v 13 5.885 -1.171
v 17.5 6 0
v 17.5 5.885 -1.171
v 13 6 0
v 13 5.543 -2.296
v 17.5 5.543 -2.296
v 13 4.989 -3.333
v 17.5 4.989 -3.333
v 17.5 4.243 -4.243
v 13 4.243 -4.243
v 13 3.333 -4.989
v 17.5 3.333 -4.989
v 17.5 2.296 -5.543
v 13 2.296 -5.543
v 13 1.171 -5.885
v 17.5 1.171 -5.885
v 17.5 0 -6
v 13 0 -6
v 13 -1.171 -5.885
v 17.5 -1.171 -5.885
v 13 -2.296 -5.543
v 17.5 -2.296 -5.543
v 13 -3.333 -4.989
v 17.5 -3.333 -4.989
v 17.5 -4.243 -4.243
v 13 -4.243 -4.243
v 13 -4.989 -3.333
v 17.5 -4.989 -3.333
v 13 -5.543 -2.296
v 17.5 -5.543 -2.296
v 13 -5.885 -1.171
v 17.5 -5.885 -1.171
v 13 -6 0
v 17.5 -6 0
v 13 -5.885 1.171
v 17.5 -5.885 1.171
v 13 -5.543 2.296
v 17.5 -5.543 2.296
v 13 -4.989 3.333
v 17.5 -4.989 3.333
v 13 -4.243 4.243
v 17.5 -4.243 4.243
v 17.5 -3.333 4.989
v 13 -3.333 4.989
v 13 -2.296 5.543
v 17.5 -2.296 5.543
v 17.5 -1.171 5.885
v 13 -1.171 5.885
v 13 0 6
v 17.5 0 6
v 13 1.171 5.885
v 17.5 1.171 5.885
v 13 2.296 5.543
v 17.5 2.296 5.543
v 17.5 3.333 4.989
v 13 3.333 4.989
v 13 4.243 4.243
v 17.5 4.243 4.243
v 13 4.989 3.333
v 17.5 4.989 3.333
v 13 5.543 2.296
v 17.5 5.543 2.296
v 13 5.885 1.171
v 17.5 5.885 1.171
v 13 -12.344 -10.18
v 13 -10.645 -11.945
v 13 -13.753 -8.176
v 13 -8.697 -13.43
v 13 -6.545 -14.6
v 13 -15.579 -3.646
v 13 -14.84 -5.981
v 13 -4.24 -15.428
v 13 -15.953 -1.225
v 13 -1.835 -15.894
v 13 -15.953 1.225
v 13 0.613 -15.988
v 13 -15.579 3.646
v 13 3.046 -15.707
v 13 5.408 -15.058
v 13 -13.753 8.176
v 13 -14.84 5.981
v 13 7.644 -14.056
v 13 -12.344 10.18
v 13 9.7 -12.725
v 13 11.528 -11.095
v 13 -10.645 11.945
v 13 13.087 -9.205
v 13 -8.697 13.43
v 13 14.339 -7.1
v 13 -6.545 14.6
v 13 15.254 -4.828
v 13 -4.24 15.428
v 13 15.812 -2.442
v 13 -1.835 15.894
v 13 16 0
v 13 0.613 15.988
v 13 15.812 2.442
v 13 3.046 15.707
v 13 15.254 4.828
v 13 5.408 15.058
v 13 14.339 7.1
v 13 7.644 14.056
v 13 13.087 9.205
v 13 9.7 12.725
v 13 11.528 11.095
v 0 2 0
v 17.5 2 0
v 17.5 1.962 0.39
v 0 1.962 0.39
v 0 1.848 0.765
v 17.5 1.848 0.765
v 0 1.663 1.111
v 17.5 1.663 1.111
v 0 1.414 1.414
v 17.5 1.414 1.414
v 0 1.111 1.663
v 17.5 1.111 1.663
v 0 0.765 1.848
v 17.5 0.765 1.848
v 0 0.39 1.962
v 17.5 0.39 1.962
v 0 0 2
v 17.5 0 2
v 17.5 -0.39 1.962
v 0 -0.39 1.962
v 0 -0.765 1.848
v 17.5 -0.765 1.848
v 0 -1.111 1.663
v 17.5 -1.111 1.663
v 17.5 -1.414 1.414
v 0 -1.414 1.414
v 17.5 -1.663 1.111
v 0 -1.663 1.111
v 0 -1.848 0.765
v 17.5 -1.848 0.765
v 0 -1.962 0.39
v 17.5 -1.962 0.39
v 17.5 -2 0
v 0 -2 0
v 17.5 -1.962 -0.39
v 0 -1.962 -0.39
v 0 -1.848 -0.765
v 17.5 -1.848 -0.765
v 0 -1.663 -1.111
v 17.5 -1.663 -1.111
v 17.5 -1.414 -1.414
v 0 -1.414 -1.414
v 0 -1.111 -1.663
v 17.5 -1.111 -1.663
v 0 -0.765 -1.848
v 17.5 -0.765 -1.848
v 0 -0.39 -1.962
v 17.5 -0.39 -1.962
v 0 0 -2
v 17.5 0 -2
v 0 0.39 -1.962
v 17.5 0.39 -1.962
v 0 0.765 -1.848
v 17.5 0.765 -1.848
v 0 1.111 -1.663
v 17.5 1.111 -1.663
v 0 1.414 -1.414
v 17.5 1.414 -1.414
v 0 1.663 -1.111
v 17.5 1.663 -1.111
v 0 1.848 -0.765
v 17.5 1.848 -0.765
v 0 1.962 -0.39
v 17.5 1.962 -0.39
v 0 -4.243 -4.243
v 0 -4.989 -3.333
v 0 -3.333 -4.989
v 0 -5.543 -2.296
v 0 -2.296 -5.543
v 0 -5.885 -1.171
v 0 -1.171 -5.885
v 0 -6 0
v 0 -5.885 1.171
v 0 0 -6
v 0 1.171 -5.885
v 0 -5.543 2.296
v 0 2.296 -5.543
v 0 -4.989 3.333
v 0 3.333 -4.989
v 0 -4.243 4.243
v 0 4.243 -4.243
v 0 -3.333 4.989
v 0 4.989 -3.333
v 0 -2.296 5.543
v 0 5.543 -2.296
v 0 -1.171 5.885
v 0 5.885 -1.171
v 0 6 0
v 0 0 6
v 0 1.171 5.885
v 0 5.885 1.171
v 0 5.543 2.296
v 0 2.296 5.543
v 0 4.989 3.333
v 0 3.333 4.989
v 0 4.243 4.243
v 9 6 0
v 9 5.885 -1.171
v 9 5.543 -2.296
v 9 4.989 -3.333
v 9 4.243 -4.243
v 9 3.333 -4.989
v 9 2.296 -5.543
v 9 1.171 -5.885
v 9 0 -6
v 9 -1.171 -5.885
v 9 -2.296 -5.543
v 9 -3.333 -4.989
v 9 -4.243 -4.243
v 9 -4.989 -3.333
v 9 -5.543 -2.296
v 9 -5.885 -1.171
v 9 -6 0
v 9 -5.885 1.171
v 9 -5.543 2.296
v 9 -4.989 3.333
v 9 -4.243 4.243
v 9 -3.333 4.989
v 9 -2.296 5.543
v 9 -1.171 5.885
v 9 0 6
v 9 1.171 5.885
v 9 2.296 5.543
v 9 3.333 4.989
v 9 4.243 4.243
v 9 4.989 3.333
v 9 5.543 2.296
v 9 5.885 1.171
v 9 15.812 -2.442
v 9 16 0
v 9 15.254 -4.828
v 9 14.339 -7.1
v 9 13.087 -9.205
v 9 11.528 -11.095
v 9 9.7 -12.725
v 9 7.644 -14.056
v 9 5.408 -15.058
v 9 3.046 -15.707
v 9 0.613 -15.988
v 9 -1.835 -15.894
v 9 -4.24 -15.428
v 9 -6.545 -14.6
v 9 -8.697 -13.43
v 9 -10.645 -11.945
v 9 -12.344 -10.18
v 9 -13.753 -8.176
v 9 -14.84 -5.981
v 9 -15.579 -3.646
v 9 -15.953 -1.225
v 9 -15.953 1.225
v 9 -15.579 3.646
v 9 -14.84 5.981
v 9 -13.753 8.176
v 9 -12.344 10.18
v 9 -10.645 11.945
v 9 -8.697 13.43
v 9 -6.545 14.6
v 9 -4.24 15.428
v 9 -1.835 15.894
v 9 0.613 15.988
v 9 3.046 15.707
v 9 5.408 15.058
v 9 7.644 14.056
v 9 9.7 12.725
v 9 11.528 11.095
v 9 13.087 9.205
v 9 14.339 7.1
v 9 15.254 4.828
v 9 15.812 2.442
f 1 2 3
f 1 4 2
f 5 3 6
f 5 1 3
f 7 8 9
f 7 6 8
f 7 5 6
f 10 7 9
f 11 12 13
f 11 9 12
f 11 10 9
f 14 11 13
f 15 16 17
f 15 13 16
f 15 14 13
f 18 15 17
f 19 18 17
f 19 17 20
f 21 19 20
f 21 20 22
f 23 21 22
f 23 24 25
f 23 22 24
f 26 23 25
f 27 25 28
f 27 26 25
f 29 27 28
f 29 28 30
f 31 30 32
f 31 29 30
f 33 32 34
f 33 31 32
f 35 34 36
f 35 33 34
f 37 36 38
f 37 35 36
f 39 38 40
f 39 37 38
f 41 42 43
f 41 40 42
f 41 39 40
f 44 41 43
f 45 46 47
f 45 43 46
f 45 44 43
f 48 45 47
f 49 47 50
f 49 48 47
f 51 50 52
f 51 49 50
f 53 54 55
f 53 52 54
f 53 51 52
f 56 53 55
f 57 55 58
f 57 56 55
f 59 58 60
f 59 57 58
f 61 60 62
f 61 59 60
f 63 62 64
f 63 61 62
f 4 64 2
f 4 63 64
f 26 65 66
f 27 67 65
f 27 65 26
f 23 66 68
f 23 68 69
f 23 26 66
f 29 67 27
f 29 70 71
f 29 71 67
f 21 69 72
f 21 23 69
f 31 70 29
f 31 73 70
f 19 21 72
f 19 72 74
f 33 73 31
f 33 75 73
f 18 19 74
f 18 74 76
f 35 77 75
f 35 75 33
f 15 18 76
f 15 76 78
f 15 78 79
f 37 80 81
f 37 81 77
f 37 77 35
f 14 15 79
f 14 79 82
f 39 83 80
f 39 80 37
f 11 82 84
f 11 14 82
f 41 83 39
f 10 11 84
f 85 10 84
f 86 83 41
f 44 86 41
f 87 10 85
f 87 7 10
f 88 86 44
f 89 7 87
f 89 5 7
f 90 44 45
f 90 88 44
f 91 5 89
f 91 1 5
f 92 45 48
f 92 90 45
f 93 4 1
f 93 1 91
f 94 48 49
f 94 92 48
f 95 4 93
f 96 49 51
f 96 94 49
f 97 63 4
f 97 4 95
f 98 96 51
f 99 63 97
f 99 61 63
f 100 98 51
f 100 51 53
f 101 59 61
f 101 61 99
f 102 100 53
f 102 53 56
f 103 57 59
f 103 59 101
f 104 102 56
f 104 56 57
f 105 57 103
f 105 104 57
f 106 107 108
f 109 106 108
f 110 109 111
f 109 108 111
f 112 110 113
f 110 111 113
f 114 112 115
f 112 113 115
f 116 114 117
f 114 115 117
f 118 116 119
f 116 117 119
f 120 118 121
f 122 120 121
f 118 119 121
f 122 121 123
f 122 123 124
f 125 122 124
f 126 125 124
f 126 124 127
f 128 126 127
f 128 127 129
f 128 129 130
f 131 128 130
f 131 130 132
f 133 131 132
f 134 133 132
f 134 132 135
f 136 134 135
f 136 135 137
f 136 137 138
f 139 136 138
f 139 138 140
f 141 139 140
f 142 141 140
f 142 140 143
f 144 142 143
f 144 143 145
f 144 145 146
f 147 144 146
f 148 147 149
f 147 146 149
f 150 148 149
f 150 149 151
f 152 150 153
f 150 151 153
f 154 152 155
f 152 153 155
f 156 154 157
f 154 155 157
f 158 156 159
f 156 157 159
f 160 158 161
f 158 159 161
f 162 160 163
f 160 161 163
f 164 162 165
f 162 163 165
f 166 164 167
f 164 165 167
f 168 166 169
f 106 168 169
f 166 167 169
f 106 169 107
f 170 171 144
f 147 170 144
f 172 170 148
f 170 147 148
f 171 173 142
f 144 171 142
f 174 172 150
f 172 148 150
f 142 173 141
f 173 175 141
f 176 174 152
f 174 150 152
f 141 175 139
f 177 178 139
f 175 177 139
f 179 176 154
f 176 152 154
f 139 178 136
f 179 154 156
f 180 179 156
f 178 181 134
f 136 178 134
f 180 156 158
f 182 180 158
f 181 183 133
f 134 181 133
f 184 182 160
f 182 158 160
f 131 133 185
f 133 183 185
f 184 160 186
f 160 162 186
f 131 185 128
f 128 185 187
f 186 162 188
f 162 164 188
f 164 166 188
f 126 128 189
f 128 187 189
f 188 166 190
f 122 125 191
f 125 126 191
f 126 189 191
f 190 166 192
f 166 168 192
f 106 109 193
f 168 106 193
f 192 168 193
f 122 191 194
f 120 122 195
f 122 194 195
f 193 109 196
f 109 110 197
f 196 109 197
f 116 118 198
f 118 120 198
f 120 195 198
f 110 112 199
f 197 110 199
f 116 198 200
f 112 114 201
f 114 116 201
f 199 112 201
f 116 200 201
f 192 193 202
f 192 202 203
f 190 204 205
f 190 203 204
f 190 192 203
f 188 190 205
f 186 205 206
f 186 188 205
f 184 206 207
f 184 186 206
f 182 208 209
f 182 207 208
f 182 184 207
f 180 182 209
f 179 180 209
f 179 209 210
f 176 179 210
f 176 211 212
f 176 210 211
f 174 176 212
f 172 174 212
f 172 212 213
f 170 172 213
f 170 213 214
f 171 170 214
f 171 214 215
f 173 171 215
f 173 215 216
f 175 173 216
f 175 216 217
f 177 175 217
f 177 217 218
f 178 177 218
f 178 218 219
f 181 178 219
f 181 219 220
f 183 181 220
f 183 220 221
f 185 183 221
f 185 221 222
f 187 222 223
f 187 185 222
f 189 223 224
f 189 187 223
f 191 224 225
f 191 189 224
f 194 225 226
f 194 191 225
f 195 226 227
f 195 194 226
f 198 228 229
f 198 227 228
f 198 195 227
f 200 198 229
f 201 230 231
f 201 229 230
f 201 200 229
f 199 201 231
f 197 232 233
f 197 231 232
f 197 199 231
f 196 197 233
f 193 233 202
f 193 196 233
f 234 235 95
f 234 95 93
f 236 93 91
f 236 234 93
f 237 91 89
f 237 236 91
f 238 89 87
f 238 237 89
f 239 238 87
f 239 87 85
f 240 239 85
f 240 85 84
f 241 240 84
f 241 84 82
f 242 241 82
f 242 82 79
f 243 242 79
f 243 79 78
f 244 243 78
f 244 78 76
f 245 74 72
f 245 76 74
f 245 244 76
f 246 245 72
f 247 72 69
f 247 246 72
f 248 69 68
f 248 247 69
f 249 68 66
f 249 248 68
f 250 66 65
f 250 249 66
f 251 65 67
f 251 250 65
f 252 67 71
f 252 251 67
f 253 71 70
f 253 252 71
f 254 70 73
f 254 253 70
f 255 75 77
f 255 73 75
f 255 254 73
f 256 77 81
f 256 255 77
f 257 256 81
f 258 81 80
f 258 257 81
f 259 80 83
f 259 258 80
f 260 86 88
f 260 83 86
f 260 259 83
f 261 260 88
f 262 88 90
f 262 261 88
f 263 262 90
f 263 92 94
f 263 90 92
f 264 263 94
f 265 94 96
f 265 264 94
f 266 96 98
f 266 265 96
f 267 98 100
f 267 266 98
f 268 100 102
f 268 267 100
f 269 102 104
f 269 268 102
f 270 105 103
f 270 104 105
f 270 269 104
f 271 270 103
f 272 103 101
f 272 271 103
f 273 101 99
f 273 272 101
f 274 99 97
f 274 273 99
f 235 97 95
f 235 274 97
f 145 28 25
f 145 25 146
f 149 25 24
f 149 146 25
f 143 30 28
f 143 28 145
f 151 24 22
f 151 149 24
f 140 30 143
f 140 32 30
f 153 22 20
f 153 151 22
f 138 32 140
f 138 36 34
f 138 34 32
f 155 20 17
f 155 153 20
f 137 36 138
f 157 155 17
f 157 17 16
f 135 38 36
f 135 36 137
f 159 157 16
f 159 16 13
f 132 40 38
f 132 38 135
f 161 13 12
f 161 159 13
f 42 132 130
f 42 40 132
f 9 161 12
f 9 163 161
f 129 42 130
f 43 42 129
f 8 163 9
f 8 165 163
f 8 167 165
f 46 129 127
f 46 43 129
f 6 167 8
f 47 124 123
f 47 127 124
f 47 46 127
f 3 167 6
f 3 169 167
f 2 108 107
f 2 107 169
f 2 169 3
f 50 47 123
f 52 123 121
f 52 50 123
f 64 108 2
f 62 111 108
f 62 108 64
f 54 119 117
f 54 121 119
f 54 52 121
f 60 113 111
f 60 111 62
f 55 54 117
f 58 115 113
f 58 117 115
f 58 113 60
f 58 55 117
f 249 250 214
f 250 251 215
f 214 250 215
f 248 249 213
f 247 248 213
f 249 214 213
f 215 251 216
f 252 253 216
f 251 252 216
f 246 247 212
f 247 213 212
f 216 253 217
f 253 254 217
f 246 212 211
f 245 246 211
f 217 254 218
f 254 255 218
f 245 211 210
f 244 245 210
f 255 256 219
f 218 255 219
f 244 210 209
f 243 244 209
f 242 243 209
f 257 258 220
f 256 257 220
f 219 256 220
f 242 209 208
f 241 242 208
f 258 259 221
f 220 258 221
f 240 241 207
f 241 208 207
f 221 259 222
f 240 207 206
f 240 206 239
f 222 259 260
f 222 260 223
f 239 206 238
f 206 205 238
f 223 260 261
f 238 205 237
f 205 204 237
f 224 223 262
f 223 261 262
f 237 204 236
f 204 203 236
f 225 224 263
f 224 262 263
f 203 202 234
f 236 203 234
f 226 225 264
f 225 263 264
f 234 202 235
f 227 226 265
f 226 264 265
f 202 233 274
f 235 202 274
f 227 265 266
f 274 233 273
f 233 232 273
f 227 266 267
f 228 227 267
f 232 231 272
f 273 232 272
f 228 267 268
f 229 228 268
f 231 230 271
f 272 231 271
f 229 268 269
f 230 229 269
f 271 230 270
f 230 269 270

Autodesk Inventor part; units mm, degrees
ref_plane "YZ Plane" through (0, 0, 0) normal (1, 0, 0) x (0, 1, 0)
ref_plane "XZ Plane" through (0, 0, 0) normal (0, 1, 0) x (-1, 0, 0)
ref_plane "XY Plane" through (0, 0, 0) normal (0, 0, 1) x (1, 0, 0)
sketch "Skizze1" plane through (0, 0, 0) normal (0, 0, 1) x (1, 0, 0)
  line L0 (0, 0) -> (16.2131, 0)
  line L1 (0, 2) -> (17.5, 2)
  line L2 (17.5, 2) -> (17.5, 6)
  line L3 (17.5, 6) -> (13, 6)
  line L4 (13, 6) -> (13, 16)
  line L5 (13, 16) -> (9, 16)
  line L6 (9, 16) -> (9, 6)
  line L7 (9, 6) -> (0, 6)
  line L8 (0, 6) -> (0, 2)
  dimension "d0" = 4
  dimension "d1" = 9
  dimension "d2" = 2
  dimension "d3" = 4.5
  dimension "d4" = 10
  dimension "d5" = 0
  dimension "d6" = 4
  dimension "d8" = 1.2869
revolve "Umdrehung1" add sketch "Skizze1" angle 360 about axis through (0, 0, 0) along (1, 0, 0)
properties part number "Kupplung"
